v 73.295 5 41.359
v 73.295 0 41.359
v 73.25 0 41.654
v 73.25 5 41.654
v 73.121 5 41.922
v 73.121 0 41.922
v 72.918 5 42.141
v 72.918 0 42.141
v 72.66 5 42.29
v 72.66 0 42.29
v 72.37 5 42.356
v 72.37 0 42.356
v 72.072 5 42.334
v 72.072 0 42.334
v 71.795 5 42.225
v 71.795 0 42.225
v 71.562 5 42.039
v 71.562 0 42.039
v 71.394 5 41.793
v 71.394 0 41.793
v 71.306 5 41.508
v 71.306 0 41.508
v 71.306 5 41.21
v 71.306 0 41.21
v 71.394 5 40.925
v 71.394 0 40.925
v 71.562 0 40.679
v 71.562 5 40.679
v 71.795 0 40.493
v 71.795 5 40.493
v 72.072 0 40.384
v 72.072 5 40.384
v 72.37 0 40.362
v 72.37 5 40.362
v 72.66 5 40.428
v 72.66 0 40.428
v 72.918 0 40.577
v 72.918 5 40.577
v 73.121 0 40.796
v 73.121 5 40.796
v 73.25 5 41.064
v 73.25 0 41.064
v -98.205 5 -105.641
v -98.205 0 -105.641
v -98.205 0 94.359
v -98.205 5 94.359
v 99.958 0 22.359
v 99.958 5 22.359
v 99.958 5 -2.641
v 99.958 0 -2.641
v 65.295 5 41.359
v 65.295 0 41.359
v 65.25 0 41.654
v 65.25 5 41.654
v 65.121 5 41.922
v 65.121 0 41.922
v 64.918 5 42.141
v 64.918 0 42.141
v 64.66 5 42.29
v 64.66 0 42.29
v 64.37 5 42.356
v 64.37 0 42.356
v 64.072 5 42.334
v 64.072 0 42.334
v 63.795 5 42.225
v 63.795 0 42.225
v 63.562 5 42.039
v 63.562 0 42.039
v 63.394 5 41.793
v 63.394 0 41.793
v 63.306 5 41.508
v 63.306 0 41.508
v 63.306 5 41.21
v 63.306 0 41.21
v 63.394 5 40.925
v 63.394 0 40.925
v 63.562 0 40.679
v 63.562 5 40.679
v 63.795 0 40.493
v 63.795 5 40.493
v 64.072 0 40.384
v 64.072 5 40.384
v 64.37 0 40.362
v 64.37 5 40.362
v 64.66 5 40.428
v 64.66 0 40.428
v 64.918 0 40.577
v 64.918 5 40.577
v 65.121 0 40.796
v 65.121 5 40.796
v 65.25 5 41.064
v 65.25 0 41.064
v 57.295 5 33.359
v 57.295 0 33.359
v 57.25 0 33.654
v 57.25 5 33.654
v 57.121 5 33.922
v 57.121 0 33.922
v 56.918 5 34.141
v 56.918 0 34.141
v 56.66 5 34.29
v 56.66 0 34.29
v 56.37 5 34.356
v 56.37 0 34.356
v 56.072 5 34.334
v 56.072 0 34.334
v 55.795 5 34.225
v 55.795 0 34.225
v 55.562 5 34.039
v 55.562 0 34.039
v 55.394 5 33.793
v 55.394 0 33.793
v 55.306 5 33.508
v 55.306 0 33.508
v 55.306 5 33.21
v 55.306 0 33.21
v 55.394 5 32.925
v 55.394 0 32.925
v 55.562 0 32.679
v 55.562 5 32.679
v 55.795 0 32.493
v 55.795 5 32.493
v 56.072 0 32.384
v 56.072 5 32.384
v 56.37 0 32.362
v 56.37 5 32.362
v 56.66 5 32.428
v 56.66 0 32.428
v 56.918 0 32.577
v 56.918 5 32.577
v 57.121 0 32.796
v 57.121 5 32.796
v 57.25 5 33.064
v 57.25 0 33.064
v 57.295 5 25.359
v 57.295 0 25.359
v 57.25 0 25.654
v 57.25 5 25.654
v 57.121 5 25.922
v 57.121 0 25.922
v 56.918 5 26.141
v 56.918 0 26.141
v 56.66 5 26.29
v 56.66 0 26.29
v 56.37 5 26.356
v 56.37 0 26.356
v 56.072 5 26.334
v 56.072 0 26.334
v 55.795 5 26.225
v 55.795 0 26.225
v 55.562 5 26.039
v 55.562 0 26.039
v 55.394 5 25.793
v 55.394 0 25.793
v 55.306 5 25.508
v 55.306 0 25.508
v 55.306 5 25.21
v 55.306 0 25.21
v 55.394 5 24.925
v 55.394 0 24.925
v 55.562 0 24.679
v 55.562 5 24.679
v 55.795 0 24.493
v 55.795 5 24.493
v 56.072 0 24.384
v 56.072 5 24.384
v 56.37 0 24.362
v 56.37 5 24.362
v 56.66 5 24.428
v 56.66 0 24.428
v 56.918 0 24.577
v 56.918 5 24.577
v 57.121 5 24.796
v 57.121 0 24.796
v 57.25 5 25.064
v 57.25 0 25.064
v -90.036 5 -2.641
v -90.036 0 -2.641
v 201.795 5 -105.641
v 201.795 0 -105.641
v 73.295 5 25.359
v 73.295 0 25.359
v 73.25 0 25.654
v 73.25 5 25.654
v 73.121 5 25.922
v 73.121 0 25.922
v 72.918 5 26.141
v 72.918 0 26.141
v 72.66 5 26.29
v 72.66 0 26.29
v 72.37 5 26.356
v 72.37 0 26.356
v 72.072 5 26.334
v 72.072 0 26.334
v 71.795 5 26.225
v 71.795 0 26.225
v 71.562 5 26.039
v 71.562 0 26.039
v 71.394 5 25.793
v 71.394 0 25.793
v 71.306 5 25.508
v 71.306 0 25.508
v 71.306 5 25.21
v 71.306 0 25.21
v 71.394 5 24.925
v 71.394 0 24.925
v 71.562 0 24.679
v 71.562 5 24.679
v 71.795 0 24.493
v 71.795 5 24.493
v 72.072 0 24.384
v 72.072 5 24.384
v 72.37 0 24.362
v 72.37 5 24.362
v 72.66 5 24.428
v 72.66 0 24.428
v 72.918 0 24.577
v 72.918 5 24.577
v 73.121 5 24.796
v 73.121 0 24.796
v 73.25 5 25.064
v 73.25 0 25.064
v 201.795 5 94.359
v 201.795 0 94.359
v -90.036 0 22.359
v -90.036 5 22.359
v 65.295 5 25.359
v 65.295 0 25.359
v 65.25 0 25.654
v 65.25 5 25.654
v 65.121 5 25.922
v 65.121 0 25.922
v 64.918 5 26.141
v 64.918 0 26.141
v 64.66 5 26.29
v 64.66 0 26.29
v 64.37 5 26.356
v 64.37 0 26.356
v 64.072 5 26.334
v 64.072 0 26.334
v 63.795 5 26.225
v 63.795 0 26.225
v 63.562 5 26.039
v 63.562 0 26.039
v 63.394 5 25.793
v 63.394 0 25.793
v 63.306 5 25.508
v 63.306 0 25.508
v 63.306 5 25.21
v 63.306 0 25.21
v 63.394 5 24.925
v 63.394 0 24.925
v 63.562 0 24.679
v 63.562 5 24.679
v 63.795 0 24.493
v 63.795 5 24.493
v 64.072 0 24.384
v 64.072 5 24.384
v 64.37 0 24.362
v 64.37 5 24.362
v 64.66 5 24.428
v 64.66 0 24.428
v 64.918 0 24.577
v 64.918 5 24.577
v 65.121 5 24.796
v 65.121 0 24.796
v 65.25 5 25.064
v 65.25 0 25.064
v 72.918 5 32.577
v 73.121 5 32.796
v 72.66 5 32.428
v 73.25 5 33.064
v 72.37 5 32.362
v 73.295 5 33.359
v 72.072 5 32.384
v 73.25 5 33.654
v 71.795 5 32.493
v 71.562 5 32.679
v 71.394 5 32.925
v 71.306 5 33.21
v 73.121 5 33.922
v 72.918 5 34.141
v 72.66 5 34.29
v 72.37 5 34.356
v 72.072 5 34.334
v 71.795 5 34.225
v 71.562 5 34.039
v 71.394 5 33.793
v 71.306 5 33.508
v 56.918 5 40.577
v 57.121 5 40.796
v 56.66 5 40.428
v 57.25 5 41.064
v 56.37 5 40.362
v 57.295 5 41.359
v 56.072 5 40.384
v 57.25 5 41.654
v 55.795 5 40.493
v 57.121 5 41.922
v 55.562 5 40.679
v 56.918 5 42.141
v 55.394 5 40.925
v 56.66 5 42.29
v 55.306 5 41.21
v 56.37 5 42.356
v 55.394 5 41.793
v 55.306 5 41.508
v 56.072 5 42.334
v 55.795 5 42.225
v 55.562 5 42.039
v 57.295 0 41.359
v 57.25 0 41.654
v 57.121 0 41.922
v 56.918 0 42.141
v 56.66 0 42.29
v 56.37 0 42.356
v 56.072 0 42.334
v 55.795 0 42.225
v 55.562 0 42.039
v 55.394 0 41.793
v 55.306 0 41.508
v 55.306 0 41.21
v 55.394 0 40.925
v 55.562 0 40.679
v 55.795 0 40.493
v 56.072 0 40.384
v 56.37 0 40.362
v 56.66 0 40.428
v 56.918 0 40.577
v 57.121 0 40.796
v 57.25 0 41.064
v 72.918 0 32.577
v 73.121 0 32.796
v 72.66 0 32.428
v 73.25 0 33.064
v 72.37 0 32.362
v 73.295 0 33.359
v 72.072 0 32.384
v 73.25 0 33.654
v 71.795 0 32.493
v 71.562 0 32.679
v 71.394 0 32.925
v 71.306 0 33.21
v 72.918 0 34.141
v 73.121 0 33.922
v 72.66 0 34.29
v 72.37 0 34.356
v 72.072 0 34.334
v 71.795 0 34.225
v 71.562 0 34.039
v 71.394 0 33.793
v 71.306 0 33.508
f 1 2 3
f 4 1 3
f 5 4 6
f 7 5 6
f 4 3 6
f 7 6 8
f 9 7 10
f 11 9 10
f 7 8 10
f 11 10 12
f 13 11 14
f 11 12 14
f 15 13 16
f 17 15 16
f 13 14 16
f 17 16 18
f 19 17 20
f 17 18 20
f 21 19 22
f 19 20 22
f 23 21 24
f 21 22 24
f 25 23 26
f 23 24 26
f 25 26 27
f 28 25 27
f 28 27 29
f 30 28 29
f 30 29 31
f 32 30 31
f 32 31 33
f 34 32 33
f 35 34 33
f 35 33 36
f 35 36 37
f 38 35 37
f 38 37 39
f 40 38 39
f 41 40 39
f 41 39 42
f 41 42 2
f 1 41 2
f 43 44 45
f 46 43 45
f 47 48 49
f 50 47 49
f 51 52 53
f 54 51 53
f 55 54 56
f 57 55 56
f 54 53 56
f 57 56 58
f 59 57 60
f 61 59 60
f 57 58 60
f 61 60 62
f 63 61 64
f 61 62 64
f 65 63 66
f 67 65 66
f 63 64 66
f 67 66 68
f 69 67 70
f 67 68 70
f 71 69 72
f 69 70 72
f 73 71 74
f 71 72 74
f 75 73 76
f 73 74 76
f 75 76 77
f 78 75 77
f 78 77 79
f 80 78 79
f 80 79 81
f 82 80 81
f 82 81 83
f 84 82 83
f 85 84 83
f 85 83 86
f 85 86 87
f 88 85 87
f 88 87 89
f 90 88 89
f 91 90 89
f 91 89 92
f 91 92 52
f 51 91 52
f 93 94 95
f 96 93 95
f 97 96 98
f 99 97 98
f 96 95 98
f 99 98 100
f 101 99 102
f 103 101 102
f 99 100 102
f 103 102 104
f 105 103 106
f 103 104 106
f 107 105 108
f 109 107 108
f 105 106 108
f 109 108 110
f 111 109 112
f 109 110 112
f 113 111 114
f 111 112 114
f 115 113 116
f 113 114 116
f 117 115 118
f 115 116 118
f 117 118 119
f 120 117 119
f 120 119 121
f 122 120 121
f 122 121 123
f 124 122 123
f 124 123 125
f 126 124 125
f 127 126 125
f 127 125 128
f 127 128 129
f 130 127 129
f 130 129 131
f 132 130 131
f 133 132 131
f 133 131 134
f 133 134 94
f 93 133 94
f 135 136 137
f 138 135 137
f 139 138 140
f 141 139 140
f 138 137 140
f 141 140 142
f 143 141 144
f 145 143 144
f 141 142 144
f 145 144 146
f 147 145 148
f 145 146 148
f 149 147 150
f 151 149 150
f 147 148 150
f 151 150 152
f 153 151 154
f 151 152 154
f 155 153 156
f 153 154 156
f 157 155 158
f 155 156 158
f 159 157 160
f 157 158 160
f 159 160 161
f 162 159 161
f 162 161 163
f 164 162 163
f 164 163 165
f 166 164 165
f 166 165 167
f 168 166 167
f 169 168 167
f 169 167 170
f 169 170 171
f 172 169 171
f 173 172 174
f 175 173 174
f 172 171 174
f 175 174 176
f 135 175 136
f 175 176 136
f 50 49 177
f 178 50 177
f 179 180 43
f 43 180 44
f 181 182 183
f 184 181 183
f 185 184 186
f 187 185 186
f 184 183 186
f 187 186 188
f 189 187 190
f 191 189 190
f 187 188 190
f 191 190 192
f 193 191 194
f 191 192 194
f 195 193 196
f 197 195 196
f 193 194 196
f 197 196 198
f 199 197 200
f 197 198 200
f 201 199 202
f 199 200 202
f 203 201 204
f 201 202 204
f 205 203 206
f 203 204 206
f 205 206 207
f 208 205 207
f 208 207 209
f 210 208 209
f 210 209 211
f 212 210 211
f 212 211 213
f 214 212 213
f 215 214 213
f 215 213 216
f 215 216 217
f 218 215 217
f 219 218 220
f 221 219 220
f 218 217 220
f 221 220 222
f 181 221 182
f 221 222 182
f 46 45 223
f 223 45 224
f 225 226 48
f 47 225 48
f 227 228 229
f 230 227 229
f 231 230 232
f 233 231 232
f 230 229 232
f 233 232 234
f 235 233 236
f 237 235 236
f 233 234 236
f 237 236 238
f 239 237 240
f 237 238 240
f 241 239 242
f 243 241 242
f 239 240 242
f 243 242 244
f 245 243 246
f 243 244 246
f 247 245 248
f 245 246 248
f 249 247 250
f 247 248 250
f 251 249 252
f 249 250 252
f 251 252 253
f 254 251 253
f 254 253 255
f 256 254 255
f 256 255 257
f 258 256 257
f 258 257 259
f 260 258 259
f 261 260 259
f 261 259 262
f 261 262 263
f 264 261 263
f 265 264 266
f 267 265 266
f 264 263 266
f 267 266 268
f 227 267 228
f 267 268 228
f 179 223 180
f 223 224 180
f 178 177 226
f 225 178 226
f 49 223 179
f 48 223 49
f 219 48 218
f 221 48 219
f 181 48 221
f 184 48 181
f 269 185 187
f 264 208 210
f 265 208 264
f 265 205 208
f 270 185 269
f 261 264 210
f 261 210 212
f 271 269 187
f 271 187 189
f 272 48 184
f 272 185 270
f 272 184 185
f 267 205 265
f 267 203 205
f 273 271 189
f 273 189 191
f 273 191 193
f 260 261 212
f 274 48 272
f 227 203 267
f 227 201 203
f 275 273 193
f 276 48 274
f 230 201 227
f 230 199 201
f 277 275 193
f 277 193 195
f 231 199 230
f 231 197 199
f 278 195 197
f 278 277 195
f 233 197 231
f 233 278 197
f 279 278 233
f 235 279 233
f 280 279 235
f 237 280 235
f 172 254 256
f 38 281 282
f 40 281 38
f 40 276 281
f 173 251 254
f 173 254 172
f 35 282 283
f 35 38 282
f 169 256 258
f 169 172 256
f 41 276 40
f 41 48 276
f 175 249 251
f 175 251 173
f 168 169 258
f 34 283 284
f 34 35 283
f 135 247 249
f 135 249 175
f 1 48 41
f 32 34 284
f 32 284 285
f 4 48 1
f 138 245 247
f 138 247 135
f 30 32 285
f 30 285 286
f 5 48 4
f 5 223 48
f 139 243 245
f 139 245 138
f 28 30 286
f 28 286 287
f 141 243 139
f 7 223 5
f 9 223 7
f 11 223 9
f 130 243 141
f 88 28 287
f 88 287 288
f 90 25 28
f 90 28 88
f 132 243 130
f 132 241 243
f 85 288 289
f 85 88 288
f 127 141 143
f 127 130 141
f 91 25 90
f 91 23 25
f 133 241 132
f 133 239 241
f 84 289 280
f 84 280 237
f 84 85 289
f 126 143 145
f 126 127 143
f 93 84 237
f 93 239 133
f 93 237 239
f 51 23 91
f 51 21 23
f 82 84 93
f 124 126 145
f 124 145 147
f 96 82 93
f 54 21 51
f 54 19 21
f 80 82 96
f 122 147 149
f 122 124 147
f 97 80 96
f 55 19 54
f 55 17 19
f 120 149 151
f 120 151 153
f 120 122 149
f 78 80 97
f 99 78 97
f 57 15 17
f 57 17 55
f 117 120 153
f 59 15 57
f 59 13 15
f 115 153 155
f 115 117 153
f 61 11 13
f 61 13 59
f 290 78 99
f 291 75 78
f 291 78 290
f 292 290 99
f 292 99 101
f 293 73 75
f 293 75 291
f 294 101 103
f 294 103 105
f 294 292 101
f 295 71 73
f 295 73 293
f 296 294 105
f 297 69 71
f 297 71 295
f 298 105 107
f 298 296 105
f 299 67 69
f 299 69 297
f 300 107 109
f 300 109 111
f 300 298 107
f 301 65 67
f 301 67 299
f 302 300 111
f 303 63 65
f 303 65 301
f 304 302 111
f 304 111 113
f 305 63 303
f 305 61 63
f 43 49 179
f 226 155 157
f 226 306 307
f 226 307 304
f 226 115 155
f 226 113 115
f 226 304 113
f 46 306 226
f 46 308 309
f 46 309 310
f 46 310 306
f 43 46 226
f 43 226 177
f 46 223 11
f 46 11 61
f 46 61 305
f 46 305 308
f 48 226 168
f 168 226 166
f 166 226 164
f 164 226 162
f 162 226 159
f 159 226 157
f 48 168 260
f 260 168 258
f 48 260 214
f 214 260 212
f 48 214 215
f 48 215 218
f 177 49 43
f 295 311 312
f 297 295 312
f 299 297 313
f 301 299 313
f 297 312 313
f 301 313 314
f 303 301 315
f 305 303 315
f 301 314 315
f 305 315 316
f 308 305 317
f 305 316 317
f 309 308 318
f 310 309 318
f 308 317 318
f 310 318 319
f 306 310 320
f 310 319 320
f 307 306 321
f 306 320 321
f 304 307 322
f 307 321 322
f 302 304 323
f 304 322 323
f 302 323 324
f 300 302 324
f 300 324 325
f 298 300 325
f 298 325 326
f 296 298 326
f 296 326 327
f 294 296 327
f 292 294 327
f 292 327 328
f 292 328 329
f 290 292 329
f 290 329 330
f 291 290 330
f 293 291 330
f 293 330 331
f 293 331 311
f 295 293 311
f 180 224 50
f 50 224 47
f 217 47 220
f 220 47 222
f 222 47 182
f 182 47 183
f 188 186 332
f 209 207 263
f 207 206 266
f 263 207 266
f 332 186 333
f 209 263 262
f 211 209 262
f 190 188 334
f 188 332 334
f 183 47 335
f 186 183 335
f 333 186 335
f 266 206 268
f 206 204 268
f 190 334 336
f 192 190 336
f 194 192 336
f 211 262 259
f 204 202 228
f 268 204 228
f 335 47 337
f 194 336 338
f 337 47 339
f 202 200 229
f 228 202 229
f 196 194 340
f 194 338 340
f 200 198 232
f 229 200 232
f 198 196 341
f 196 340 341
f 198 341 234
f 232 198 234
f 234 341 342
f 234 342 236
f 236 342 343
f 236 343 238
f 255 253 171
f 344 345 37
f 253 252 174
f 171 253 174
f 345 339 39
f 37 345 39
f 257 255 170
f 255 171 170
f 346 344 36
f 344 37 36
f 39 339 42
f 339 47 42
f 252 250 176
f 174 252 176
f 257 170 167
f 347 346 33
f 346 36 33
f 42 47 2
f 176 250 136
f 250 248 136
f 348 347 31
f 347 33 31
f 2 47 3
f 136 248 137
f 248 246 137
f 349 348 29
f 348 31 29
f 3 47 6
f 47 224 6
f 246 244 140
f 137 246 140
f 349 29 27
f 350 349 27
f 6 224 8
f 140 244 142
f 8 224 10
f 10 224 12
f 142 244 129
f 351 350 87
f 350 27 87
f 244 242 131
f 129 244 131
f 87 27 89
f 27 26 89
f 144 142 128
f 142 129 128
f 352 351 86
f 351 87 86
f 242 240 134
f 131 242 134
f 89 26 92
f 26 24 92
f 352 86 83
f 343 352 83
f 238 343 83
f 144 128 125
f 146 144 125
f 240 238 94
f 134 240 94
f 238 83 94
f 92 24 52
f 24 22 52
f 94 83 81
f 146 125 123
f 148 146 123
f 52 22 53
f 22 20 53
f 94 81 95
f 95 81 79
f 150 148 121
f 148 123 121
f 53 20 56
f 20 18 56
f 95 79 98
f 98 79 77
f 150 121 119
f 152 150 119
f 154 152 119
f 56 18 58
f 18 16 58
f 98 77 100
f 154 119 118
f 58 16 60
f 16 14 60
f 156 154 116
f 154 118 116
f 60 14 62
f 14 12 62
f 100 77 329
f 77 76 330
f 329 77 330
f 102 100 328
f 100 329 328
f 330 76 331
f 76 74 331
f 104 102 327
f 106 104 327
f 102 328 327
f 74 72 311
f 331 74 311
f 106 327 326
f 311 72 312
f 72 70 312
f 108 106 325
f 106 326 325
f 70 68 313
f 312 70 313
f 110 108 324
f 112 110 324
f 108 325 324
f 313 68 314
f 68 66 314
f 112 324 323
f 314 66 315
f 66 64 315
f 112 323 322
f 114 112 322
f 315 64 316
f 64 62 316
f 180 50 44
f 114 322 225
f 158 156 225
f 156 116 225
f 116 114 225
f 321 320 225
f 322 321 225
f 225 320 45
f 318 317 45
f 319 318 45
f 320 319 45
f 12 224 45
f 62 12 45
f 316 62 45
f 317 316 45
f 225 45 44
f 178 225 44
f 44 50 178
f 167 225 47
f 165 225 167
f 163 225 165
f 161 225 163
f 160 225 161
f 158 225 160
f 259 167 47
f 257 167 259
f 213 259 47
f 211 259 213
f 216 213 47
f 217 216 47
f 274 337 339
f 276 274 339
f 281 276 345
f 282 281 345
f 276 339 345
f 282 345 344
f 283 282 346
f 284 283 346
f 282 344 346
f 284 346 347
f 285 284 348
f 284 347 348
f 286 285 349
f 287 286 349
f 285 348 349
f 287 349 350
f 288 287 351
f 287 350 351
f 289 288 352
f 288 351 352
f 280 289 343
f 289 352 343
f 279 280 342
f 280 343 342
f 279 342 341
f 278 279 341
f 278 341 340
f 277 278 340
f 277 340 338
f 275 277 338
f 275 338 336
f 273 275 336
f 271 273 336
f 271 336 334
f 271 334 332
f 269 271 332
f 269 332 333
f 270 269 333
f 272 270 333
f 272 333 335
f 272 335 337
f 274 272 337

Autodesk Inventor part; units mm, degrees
ref_plane "YZ Plane" through (0, 0, 0) normal (1, 0, 0) x (0, 1, 0)
ref_plane "XZ Plane" through (0, 0, 0) normal (0, 1, 0) x (-1, 0, 0)
ref_plane "XY Plane" through (0, 0, 0) normal (0, 0, 1) x (1, 0, 0)
sketch "Esquisse1" plane through (0, 0, 0) normal (0, 1, 0) x (-1, 0, 0)
  line L0 (98.2051, 94.359) -> (-201.7949, 94.359)
  line L1 (-201.7949, 94.359) -> (-201.7949, -105.641)
  line L2 (-201.7949, -105.641) -> (98.2051, -105.641)
  line L3 (98.2051, -105.641) -> (98.2051, 94.359)
  point P0 (0, 0)
  dimension "d0" = 200
  dimension "d1" = 300
extrude "Extrusion1" add sketch "Esquisse1" along normal blind 5
sketch "Esquisse2" plane through (0, 5, 0) normal (0, 1, 0) x (1, 0, 0)
  line L0 (89.9575, -12.359) -> (-80.036, -12.359) projected
  line L1 (89.9575, -7.359) -> (-80.036, -7.359) projected
  line L2 (-80.036, -12.359) -> (-80.036, -7.359) projected
  line L3 (89.9575, -12.359) -> (89.9575, -7.359) projected
  line L4 (-90.036, -22.359) -> (99.9575, -22.359)
  line L5 (99.9575, -22.359) -> (99.9575, 2.641)
  line L6 (99.9575, 2.641) -> (-90.036, 2.641)
  line L7 (-90.036, 2.641) -> (-90.036, -22.359)
  point P0 (0, 0)
  dimension "d4" = 10
  dimension "d5" = 10
  dimension "d6" = 10
  dimension "d7" = 10
extrude "Extrusion2" cut sketch "Esquisse2" against normal through all contours L0 L2 L1 L3 | L7 L6 L5 L4
sketch "Esquisse3" plane through (0, 0, 0) normal (0, -1, 0) x (1, 0, 0)
  circle A0 centre (56.2949, 33.359) radius 1 projected
  line L0 (57.2949, 15.359) -> (55.2949, 15.359) projected
  circle A1 centre (56.2949, 41.359) radius 1 projected
  circle A2 centre (64.2949, 41.359) radius 1 projected
  circle A3 centre (72.2949, 33.359) radius 1 projected
  circle A4 centre (72.2949, 41.359) radius 1 projected
  circle A5 centre (72.2949, 25.359) radius 1 projected
  circle A6 centre (64.2949, 25.359) radius 1 projected
  circle A7 centre (56.2949, 25.359) radius 1 projected
  point P0 (0, 0)
extrude "Extrusion3" cut sketch "Esquisse3" against normal through all
properties part number "face-lateral"
